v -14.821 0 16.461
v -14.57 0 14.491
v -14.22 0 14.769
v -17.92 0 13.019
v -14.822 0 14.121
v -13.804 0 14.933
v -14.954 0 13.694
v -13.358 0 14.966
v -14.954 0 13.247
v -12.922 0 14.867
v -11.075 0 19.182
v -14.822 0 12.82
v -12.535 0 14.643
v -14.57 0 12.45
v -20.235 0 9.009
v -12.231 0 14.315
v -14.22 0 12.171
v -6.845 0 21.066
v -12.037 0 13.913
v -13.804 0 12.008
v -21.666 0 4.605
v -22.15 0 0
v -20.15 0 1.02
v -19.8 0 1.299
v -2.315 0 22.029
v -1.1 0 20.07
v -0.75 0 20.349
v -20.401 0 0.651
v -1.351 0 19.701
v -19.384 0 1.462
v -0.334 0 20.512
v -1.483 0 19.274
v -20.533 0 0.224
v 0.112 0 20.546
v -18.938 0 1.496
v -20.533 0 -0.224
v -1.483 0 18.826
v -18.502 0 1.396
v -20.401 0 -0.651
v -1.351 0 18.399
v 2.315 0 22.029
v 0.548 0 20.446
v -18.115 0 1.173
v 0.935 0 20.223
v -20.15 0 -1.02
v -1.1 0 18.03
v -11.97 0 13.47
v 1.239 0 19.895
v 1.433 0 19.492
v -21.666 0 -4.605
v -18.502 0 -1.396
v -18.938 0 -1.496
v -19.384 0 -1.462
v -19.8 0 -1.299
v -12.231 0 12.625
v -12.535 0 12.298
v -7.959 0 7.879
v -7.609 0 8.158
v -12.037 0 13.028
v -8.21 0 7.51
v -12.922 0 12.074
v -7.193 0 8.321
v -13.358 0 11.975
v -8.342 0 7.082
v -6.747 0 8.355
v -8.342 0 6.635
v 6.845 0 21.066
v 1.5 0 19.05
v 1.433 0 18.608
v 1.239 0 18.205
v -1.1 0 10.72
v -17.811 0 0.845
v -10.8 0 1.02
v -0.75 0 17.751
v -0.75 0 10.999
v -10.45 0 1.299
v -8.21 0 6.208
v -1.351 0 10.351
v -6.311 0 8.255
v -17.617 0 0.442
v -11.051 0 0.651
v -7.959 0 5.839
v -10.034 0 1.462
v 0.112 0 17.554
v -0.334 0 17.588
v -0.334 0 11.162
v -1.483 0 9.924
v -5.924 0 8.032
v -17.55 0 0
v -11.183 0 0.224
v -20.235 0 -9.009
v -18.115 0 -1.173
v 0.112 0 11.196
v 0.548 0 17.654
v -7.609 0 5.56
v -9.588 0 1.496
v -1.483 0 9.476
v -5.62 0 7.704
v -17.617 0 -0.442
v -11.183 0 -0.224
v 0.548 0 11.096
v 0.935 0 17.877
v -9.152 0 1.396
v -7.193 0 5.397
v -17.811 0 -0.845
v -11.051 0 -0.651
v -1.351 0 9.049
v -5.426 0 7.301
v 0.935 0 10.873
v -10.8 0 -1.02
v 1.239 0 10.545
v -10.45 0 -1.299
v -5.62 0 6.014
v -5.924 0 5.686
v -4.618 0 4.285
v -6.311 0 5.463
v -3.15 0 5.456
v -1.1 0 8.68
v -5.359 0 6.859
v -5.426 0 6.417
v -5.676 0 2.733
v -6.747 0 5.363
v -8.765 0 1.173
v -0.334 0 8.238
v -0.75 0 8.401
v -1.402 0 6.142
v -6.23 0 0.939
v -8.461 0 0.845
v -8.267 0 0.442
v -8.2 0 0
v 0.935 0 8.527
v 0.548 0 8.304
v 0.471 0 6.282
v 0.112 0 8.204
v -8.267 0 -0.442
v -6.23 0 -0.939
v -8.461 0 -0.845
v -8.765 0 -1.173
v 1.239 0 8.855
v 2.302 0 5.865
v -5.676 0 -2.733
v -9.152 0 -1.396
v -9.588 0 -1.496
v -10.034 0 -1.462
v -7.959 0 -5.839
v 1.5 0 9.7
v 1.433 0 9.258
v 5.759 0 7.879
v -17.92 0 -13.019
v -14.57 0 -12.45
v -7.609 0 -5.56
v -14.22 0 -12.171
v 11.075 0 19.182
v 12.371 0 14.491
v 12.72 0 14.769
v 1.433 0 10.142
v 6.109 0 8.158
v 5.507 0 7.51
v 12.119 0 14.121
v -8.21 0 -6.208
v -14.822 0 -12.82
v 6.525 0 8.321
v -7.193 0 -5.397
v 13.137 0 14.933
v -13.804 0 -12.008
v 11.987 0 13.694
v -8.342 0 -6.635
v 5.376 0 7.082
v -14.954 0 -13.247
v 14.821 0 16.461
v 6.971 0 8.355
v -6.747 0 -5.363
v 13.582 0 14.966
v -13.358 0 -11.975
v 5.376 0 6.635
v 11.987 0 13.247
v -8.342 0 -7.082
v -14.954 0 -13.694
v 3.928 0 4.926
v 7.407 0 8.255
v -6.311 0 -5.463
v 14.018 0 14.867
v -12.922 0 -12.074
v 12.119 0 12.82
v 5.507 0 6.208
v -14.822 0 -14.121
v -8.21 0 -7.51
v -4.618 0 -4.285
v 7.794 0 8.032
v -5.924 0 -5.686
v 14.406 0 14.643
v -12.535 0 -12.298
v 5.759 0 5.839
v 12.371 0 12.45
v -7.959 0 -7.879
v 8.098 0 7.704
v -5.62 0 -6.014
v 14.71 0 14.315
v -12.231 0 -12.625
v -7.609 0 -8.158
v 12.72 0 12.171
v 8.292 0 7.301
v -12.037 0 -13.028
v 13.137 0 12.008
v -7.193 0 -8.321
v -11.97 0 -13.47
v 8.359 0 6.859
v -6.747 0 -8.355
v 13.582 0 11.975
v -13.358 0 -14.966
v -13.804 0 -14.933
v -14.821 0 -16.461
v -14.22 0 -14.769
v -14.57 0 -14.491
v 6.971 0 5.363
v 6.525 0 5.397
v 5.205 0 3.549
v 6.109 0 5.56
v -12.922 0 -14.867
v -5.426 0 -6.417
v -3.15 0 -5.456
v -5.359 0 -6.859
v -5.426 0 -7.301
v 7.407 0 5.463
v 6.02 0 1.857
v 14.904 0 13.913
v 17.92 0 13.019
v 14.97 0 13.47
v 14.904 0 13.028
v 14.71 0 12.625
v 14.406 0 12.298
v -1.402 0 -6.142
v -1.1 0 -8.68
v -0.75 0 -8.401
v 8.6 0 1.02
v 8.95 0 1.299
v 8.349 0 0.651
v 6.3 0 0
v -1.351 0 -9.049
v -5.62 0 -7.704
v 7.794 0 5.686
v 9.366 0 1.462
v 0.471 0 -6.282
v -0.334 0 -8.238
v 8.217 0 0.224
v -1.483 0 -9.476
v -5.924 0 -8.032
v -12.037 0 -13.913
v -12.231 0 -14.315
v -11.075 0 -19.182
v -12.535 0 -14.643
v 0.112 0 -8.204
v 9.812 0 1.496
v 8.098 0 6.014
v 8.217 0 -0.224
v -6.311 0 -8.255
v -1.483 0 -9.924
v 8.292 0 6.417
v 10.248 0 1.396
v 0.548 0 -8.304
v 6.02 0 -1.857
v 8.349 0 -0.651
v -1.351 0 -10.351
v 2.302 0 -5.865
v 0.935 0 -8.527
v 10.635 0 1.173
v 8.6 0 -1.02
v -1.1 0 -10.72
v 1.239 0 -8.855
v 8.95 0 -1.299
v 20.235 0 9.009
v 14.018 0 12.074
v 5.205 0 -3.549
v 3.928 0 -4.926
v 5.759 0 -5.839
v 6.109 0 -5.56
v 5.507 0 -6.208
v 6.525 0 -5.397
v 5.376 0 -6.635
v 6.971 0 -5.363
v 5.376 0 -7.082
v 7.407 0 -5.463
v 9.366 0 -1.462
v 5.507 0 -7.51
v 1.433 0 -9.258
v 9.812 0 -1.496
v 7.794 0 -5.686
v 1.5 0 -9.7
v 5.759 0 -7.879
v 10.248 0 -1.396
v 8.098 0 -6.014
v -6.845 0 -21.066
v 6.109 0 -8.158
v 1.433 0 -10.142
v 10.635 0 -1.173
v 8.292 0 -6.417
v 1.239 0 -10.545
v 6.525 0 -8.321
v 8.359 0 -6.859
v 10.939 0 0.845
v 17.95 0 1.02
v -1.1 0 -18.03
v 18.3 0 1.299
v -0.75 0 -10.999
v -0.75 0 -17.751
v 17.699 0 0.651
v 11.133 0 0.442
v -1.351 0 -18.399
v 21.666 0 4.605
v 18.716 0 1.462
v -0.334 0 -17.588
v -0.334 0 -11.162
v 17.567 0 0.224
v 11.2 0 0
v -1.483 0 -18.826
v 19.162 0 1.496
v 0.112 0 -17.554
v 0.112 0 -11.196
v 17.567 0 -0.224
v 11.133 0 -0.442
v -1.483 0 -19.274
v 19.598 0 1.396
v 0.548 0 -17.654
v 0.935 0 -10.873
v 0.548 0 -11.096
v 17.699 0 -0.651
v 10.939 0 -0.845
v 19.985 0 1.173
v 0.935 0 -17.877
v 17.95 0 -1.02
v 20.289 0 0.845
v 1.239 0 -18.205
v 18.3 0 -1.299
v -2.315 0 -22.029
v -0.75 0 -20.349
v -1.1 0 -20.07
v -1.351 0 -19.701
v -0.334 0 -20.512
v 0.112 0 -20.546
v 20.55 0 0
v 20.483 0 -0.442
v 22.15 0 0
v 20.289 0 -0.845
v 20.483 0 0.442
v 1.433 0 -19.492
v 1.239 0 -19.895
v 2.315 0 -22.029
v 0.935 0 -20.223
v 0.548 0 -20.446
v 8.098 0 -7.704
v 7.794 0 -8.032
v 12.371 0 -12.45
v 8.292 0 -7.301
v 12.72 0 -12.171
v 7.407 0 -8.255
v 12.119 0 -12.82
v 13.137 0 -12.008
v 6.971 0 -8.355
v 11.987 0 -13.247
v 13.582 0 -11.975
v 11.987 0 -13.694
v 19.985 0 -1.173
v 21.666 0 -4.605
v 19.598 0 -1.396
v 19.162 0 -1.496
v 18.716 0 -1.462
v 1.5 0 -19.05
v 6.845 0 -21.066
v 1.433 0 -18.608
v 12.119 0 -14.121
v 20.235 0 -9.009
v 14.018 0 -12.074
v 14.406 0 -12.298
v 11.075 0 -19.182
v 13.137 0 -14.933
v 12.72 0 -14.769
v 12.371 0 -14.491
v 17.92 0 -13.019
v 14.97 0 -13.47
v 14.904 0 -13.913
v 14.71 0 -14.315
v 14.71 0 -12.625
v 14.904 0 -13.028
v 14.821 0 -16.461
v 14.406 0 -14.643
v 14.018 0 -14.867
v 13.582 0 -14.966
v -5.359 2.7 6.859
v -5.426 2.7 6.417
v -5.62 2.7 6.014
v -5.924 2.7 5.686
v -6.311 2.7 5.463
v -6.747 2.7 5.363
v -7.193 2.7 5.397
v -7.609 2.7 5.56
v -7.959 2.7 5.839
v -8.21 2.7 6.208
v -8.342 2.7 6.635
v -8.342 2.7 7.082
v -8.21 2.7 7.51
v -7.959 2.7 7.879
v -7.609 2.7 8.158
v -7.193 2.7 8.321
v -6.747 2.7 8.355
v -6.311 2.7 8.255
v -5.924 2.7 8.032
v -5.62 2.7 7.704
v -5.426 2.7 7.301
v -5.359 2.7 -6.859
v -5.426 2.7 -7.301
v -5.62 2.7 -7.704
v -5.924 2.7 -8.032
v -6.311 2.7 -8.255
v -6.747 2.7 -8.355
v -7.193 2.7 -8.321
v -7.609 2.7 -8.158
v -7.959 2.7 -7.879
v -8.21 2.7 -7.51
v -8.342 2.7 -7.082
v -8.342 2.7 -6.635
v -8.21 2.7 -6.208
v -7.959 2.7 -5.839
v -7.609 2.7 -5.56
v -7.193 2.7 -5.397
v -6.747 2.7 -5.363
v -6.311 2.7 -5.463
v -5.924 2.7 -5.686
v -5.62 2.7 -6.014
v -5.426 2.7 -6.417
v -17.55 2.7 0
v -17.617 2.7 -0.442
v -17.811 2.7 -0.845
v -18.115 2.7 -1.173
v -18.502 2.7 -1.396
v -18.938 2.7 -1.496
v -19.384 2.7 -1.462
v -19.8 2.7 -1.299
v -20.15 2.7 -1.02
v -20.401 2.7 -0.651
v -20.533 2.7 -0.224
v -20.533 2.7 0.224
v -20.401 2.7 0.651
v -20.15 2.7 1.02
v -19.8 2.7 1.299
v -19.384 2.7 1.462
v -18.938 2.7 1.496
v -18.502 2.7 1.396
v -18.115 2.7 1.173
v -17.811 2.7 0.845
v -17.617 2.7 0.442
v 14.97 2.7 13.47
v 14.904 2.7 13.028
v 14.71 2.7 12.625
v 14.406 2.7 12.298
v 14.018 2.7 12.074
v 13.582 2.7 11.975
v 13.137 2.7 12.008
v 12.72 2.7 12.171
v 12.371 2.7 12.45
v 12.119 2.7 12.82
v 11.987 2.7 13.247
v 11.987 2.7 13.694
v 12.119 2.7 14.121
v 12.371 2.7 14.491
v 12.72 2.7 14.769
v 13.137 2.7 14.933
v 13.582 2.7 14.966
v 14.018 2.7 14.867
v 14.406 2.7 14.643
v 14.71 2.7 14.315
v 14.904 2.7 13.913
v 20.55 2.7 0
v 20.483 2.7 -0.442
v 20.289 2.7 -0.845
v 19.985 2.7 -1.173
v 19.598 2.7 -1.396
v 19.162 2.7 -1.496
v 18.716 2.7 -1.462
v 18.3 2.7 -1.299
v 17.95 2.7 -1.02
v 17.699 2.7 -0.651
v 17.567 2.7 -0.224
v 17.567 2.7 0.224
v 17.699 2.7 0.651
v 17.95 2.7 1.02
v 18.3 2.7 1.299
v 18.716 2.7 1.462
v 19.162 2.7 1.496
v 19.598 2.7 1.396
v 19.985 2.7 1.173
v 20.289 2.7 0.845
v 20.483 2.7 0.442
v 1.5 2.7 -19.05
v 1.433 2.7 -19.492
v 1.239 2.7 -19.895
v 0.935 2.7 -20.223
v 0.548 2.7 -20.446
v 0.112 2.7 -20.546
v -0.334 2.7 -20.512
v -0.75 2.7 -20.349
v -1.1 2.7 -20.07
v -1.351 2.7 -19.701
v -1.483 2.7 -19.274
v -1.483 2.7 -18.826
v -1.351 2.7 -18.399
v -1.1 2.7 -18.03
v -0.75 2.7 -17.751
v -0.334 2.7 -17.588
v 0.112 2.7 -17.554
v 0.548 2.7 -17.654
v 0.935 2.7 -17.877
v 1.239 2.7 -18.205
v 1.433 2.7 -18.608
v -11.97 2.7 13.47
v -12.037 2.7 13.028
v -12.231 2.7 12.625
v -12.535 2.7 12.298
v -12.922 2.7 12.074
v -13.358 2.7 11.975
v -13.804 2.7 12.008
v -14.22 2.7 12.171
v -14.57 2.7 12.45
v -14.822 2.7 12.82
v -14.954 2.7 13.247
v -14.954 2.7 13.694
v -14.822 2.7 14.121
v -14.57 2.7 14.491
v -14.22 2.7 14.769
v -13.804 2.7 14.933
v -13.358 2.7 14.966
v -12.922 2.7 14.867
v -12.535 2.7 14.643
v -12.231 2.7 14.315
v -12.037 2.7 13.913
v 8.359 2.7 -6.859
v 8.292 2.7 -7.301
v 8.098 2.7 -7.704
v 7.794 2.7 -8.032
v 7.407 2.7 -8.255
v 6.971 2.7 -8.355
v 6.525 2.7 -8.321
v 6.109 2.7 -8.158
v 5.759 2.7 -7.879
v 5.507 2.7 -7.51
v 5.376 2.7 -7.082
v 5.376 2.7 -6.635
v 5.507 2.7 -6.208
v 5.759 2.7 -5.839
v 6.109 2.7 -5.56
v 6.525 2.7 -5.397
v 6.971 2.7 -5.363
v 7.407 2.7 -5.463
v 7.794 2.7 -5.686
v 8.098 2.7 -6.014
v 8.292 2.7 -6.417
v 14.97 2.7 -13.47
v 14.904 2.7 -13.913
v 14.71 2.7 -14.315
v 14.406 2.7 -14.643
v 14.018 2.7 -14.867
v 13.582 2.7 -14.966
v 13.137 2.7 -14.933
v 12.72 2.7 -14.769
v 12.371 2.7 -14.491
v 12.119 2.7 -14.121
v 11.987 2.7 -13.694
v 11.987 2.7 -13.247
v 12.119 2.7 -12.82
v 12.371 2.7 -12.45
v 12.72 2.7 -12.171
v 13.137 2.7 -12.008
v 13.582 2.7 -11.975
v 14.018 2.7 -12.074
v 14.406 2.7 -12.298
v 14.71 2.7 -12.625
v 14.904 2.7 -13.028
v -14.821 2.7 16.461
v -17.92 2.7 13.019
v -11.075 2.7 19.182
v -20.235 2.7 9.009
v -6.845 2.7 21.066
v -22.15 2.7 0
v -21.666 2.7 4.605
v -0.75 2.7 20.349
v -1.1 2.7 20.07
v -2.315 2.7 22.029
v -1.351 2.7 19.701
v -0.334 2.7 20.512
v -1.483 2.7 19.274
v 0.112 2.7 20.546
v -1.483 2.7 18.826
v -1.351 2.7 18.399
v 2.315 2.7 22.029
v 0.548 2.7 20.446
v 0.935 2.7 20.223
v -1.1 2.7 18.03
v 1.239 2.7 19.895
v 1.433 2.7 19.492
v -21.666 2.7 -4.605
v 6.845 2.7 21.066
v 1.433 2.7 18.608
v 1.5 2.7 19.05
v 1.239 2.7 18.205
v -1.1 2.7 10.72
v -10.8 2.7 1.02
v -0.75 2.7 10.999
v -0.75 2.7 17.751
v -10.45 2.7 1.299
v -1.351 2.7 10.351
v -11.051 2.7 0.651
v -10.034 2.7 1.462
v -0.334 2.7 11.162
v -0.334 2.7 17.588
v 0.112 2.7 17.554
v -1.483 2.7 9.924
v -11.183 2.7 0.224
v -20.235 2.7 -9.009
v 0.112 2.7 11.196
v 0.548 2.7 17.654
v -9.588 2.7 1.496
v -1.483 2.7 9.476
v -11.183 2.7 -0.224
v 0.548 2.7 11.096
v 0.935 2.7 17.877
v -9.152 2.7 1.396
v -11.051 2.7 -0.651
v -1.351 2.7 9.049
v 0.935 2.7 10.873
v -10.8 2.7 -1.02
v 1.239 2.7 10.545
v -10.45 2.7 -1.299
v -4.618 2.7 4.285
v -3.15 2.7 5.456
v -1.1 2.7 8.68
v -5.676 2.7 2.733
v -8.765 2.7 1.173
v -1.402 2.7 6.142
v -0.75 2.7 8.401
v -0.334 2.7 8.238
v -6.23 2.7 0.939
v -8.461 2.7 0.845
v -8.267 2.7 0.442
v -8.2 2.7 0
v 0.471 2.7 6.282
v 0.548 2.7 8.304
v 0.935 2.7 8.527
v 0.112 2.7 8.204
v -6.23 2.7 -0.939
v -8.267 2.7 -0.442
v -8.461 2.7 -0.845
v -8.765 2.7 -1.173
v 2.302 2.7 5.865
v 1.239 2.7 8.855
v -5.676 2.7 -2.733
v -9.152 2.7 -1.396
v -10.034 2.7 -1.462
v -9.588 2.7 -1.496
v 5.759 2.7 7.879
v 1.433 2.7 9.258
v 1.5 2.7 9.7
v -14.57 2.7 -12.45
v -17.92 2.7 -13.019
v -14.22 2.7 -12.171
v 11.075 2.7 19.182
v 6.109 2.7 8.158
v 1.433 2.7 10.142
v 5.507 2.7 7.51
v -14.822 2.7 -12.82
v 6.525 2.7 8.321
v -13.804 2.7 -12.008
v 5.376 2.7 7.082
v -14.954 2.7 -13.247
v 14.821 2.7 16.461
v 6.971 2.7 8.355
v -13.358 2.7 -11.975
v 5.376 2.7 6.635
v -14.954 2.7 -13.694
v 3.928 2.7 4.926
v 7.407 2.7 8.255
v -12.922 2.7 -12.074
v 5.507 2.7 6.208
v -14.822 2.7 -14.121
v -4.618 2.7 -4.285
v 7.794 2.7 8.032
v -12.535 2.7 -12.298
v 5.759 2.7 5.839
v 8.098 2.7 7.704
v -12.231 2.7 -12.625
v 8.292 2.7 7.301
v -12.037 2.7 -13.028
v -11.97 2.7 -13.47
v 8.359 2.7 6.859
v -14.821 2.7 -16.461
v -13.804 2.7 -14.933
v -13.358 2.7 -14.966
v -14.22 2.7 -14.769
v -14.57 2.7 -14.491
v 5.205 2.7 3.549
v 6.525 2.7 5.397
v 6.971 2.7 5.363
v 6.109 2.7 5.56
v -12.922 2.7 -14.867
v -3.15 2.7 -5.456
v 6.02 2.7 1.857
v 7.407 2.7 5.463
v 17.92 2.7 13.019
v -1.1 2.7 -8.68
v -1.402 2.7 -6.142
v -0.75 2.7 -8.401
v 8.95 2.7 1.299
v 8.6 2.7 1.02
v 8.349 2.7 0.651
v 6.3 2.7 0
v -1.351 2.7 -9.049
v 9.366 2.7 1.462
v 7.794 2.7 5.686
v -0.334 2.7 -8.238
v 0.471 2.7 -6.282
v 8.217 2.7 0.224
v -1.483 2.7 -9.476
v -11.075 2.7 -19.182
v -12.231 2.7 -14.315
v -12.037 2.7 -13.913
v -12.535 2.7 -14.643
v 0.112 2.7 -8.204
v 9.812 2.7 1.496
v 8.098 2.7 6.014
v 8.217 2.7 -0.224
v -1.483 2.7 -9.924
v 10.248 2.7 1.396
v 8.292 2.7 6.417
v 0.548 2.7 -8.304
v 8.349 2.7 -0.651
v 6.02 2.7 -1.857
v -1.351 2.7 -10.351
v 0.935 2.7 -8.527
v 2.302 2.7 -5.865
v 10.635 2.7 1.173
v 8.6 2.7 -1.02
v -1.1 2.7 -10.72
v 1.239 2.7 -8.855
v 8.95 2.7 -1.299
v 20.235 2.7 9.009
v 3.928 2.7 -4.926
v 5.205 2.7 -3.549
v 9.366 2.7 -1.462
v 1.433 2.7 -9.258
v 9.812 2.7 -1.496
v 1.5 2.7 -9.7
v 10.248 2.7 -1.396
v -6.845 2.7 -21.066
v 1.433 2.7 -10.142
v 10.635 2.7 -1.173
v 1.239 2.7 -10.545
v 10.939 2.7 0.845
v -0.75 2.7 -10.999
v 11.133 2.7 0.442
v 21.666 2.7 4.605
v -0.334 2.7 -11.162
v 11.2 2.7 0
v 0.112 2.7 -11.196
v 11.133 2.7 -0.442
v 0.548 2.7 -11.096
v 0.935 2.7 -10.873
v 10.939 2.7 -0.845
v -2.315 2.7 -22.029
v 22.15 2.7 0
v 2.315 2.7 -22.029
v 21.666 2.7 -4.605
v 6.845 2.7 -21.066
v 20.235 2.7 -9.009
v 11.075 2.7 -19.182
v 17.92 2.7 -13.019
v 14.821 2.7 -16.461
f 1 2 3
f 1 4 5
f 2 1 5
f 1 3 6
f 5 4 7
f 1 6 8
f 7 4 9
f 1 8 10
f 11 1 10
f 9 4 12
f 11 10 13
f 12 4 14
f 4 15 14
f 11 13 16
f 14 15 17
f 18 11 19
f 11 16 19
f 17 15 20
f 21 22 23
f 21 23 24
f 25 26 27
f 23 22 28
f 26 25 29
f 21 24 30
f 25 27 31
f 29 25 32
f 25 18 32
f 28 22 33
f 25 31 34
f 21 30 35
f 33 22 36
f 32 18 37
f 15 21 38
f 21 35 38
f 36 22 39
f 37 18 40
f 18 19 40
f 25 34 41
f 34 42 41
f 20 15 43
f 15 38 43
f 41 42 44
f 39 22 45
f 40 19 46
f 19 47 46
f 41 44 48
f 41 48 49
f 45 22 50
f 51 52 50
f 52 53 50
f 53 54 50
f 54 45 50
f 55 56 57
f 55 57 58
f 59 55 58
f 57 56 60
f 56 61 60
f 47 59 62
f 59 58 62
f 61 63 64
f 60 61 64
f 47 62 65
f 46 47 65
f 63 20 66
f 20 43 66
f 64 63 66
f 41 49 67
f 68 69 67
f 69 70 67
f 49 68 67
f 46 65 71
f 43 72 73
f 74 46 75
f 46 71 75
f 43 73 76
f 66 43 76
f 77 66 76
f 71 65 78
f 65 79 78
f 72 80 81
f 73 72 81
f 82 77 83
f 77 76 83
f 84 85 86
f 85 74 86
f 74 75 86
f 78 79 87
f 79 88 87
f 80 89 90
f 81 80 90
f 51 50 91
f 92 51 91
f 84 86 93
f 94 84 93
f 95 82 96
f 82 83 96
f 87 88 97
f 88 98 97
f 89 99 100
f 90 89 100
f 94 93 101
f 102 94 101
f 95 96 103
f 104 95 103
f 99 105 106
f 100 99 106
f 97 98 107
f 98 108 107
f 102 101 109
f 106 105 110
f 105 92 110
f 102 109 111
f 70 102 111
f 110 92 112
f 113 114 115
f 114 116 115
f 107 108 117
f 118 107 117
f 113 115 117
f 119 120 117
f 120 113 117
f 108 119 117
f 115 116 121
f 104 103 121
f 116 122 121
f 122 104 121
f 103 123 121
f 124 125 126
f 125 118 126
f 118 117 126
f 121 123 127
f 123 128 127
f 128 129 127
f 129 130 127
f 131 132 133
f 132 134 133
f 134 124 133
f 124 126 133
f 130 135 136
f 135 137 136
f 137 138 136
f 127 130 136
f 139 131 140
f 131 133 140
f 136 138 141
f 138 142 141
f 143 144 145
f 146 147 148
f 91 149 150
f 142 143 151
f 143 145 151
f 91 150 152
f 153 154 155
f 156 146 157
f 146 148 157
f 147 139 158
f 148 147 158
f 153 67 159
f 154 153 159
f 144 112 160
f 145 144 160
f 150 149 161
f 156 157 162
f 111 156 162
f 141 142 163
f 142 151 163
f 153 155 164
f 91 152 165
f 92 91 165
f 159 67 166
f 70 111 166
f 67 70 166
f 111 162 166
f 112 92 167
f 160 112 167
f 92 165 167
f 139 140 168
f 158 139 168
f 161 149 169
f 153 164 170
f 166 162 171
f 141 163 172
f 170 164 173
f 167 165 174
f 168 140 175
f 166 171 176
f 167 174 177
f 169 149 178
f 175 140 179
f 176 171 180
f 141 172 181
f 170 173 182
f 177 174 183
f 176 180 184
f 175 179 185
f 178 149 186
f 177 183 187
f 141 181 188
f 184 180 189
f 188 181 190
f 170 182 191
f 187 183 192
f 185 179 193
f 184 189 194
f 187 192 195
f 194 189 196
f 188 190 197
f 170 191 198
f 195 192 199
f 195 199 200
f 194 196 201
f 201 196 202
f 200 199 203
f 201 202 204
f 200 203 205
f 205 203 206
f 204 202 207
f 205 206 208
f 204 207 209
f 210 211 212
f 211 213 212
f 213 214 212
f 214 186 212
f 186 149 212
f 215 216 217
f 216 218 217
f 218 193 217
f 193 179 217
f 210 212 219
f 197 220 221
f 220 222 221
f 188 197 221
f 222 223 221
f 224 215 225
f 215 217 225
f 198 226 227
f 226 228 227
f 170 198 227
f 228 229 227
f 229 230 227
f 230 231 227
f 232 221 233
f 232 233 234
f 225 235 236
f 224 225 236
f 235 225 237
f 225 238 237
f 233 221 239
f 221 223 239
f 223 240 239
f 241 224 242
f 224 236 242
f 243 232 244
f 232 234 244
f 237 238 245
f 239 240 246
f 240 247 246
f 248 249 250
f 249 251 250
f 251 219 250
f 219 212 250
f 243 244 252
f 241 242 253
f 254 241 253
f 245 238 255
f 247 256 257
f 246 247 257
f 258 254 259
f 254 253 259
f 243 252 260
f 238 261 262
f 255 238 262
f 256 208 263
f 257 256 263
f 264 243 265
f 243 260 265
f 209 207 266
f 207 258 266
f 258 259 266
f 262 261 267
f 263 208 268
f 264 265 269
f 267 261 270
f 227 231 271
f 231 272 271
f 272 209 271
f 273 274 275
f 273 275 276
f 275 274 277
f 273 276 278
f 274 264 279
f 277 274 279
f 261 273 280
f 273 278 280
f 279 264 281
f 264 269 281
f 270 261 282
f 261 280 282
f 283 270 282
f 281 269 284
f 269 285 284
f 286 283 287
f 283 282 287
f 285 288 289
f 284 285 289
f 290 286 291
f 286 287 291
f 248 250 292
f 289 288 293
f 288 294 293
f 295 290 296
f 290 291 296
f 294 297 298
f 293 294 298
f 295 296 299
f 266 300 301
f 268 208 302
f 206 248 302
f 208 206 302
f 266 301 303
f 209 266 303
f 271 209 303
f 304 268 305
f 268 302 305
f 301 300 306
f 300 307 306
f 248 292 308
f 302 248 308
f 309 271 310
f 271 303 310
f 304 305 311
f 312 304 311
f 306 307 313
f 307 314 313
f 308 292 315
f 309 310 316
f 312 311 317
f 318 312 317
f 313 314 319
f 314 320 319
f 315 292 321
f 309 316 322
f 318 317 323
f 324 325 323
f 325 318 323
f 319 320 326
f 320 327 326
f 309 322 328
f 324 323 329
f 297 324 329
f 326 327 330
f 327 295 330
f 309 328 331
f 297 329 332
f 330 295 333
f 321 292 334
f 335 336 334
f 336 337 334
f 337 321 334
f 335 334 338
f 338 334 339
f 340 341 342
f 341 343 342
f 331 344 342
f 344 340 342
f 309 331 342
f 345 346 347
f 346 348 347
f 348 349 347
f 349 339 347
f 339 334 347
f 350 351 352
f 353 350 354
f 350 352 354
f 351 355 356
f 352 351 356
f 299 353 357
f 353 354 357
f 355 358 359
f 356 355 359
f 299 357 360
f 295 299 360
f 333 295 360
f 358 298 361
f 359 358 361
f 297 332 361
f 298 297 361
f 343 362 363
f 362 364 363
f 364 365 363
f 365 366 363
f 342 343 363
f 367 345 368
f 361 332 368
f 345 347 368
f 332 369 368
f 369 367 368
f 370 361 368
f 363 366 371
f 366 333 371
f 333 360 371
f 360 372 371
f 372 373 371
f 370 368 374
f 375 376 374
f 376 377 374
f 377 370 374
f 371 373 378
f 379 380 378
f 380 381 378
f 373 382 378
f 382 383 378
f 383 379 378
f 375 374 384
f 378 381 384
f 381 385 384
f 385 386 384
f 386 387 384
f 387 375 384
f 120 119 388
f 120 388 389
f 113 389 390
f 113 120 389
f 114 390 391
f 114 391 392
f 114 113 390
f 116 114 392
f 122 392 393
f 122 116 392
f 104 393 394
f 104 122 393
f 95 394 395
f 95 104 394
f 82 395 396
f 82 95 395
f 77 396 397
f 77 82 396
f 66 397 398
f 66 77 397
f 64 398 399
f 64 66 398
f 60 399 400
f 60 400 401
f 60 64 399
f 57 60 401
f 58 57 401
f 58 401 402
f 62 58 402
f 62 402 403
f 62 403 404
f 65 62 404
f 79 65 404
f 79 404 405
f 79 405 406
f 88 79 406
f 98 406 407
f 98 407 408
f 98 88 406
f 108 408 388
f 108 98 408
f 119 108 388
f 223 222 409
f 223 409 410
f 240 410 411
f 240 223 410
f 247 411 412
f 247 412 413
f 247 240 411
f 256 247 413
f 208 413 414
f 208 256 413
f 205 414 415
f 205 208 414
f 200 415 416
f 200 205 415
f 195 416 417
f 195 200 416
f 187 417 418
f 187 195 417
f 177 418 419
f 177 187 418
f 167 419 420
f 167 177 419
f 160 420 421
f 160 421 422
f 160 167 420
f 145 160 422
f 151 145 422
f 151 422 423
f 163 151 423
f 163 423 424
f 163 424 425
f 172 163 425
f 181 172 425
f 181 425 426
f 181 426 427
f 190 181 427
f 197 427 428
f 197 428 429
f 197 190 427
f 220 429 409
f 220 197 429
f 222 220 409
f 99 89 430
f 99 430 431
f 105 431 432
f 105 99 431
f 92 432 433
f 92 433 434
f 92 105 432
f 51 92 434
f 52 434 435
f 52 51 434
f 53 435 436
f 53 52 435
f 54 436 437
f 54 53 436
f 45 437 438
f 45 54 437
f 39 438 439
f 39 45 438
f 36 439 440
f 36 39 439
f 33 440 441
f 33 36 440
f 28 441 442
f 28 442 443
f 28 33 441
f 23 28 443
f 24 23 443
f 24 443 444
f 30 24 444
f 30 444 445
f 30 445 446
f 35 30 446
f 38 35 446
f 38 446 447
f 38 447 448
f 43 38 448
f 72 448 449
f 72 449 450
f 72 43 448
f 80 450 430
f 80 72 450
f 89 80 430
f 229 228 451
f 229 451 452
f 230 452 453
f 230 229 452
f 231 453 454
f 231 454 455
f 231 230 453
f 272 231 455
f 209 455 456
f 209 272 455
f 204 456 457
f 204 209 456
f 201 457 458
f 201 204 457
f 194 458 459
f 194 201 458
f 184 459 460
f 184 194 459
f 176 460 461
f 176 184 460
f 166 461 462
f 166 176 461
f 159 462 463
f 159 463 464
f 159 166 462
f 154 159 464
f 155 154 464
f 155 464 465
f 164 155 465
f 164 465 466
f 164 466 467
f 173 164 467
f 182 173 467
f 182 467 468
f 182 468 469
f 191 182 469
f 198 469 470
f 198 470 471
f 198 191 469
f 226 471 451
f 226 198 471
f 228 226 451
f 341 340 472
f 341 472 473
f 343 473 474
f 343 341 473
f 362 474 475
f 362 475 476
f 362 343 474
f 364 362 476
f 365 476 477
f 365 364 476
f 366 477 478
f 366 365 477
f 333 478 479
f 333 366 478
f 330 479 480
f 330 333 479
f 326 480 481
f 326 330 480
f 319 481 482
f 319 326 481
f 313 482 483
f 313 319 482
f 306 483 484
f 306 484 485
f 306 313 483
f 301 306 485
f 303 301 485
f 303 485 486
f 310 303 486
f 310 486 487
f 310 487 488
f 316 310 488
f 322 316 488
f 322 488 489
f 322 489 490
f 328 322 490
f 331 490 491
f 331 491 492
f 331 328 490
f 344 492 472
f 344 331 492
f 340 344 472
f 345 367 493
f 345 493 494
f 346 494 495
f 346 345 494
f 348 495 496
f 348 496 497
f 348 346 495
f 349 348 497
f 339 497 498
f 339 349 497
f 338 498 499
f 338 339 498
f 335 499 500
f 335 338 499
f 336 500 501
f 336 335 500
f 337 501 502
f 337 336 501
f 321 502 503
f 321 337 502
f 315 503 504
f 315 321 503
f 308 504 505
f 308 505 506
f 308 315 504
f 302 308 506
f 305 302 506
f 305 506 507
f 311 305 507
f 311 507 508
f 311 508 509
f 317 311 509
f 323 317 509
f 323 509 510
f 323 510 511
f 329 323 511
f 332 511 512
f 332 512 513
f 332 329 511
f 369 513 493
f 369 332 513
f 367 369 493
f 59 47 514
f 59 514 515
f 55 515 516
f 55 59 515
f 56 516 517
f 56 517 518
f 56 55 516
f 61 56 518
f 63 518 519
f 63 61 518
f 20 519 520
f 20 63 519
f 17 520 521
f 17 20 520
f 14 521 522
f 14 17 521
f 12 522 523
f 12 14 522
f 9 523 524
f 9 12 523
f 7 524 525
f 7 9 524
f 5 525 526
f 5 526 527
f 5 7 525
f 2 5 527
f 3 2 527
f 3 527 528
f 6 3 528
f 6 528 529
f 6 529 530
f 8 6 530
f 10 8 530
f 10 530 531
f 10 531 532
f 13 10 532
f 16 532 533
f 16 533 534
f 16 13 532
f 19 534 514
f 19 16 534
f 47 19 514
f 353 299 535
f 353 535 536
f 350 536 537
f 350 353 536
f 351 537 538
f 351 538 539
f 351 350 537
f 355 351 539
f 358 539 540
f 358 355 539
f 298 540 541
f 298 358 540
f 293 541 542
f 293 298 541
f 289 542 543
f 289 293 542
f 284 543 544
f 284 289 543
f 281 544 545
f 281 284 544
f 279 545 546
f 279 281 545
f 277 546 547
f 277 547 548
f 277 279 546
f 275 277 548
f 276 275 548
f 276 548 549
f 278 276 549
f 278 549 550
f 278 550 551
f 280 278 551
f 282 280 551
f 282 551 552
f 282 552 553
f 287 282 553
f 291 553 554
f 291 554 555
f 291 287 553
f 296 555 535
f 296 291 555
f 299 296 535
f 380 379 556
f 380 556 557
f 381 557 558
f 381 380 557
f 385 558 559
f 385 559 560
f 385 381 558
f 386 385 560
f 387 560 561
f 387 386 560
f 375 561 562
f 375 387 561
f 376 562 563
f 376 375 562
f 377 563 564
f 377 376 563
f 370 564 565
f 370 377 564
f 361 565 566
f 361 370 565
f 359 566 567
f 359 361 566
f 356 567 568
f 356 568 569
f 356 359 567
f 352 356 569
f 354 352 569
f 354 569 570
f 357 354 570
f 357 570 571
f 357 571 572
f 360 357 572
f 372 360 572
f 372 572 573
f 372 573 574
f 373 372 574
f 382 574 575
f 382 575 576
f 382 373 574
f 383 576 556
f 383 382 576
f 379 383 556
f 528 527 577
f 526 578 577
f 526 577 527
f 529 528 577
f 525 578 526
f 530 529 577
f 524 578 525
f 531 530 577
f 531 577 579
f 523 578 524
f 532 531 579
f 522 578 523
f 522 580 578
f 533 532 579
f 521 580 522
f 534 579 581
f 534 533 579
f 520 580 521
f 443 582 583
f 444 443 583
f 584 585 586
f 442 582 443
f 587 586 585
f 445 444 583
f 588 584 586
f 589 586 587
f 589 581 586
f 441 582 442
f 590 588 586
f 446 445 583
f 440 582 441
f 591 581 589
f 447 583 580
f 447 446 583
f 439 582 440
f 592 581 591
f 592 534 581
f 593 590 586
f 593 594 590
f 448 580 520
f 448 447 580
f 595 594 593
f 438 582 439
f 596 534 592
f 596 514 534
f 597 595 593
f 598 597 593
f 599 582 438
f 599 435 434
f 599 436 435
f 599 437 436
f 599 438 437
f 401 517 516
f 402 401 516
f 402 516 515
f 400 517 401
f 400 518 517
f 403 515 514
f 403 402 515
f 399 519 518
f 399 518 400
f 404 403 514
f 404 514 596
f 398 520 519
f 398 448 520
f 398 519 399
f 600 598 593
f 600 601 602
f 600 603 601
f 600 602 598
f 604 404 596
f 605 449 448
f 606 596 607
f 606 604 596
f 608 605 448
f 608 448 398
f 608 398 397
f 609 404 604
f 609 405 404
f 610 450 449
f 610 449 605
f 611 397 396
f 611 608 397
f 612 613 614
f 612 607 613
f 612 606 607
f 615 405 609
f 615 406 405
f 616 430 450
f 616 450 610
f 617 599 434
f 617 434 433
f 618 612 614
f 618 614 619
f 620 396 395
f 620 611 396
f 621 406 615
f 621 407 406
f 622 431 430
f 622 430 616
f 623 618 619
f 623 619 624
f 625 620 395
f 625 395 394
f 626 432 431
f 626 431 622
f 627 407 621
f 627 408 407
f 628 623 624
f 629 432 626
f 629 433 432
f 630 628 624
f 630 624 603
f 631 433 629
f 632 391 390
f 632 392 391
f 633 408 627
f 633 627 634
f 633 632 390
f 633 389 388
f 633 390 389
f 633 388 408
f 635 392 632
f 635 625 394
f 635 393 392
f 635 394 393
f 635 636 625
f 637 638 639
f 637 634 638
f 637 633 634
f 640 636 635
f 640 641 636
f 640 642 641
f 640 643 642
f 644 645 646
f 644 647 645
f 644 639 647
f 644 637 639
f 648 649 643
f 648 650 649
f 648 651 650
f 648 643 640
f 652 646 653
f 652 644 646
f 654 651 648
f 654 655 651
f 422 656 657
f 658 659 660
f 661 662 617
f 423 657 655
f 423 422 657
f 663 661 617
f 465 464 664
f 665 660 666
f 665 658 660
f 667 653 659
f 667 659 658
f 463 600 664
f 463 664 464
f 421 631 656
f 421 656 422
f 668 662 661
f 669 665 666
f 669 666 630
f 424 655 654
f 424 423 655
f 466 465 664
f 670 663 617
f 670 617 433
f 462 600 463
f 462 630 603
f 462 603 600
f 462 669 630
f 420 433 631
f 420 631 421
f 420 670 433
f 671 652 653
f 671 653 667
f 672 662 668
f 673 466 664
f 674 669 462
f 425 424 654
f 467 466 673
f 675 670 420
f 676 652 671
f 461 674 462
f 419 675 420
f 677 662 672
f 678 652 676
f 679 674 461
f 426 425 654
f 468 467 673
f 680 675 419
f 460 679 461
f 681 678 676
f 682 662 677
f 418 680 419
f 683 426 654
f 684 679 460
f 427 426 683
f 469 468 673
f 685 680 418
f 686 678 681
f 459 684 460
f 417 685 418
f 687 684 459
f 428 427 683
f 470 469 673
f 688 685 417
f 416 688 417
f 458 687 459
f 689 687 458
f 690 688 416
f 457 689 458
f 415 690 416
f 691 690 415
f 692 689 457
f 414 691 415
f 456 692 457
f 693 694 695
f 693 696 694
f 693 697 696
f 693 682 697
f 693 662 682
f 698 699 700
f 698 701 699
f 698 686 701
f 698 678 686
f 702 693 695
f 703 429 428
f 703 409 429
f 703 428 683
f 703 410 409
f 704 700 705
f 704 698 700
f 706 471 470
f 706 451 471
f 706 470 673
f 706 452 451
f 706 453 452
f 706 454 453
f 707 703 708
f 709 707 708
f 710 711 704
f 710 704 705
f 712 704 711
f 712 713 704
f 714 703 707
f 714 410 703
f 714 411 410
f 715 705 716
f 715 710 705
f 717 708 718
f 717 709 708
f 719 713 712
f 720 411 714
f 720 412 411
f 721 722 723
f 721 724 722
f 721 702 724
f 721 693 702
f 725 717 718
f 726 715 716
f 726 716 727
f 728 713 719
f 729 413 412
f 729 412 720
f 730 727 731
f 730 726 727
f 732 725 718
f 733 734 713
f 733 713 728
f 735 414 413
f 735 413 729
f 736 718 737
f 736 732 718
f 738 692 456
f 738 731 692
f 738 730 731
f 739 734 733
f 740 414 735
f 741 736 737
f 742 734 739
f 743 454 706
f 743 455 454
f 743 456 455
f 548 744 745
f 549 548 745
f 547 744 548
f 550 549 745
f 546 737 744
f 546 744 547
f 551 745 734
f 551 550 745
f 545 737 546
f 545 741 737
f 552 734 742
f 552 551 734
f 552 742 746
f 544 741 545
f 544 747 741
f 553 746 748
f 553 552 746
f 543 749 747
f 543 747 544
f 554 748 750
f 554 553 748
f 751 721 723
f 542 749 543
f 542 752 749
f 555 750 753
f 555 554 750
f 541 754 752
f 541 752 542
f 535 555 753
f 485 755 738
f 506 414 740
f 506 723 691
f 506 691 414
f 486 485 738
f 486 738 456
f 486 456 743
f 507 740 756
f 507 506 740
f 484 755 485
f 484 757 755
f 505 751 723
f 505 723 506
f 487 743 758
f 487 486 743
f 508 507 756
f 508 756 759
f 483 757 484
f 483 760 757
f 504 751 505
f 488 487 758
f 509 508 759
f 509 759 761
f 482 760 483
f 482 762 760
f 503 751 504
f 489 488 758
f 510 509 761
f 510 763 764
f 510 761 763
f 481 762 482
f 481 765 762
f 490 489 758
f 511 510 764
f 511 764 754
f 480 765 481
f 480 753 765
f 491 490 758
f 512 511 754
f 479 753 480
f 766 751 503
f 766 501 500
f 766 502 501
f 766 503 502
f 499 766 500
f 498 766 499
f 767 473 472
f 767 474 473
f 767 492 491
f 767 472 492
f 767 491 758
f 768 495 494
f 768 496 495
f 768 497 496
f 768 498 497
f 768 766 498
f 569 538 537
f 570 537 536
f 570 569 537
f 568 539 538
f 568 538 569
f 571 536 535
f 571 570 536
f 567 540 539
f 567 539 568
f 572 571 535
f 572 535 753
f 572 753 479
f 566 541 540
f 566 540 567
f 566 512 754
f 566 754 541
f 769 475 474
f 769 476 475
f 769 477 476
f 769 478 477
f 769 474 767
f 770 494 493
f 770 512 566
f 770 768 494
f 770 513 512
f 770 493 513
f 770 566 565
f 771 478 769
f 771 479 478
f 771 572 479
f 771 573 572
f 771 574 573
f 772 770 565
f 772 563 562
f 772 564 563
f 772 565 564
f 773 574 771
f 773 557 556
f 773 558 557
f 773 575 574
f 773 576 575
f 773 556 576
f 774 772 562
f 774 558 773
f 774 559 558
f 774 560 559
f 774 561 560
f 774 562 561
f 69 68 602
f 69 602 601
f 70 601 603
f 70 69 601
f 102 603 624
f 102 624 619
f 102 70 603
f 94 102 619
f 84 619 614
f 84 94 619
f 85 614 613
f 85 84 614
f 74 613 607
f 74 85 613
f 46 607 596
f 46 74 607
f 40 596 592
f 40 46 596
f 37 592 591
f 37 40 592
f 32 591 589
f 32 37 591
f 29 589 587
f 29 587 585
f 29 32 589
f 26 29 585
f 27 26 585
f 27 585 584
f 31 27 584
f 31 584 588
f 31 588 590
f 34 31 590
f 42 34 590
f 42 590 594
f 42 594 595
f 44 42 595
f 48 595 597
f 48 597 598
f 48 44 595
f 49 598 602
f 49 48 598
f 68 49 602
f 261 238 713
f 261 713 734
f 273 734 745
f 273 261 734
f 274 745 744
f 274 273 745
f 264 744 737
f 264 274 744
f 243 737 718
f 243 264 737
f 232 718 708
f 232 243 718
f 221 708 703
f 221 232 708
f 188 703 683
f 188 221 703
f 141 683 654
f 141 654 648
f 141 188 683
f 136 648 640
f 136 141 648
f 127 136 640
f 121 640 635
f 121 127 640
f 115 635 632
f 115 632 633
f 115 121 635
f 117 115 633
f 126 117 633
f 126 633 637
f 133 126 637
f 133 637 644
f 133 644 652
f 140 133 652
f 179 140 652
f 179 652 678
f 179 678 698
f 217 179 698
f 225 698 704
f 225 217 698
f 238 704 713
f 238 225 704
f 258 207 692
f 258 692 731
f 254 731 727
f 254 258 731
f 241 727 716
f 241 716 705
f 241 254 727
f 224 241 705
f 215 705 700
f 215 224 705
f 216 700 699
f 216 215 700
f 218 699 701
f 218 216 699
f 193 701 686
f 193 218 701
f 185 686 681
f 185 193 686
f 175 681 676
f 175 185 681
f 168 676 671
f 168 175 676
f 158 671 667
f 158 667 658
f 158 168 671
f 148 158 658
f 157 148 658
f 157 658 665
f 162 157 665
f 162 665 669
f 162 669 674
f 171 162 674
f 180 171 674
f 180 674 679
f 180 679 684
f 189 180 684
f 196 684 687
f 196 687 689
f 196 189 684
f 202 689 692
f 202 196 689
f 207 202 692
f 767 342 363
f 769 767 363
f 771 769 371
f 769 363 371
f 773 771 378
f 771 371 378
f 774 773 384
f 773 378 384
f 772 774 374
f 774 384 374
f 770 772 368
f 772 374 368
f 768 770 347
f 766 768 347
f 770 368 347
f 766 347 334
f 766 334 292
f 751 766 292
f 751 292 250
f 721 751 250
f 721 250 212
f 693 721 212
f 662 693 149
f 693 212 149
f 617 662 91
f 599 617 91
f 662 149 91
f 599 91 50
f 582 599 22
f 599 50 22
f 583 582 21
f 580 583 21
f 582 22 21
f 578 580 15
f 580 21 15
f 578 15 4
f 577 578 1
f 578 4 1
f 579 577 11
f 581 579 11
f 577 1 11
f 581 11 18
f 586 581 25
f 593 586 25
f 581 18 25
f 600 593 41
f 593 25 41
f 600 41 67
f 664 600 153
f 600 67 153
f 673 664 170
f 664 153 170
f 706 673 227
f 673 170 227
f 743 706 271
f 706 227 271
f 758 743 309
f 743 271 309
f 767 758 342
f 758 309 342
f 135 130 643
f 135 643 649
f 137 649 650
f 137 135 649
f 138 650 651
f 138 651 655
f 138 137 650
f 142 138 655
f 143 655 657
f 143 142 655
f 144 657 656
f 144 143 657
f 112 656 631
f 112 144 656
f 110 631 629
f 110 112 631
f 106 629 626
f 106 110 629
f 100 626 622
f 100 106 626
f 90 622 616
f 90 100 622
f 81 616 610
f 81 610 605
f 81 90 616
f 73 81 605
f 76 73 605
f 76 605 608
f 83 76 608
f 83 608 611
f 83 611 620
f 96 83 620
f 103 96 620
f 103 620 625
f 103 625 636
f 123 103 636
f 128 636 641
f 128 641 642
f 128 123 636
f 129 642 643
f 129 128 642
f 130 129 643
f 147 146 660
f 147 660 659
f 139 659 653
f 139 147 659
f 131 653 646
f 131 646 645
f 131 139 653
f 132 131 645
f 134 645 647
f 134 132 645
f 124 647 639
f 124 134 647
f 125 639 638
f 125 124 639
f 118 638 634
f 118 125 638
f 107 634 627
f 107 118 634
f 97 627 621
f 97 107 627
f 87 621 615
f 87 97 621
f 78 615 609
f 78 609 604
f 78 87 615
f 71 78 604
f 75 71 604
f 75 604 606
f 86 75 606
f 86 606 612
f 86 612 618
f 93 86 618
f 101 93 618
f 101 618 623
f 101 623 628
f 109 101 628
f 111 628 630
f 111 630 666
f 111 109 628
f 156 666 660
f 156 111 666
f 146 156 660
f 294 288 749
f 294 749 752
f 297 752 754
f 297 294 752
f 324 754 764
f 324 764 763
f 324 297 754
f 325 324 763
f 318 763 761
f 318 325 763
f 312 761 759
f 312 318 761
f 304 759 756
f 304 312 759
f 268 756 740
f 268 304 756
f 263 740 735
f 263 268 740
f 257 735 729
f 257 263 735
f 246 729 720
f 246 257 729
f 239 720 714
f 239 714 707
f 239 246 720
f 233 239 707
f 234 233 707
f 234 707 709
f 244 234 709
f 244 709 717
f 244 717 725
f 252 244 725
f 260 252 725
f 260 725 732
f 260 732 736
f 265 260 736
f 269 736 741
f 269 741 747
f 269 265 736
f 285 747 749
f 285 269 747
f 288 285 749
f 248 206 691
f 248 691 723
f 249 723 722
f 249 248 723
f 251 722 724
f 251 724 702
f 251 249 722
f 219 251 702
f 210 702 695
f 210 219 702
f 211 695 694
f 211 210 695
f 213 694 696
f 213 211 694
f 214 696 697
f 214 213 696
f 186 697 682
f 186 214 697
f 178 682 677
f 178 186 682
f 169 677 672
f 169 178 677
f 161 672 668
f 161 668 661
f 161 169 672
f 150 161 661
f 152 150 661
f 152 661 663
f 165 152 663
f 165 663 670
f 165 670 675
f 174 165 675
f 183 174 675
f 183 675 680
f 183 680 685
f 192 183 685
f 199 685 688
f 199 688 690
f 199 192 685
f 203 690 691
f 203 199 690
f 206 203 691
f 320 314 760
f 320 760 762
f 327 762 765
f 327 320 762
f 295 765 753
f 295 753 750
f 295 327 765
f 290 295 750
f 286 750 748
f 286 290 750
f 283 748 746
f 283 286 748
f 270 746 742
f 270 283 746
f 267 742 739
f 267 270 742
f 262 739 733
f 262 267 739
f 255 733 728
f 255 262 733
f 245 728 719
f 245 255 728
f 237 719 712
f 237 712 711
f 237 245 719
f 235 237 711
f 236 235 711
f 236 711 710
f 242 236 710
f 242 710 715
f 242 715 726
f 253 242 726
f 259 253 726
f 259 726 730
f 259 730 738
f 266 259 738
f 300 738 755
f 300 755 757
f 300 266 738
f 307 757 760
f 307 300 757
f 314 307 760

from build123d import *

# Parameters (mm, degrees)
CROQUIS1_R              = 22.15
CROQUIS1_R_2            = 6.3
CROQUIS1_R_3            = 1.5
SALIENTE_EXTRUIR1_DEPTH = 2.7


with BuildPart() as part:
    # Croquis1 → Saliente-Extruir1 (new body)
    with BuildSketch(Plane(origin=(0, 0, 0), x_dir=(1, 0, 0), z_dir=(0, 1, 0))):
        Circle(CROQUIS1_R)
        Circle(CROQUIS1_R_2, mode=Mode.SUBTRACT)
        with Locations((0, 19.05)):
            Circle(CROQUIS1_R_3, mode=Mode.SUBTRACT)
        with Locations((13.470384182, 13.470384182)):
            Circle(CROQUIS1_R_3, mode=Mode.SUBTRACT)
        with Locations((19.05, 0)):
            Circle(CROQUIS1_R_3, mode=Mode.SUBTRACT)
        with Locations((13.470384182, -13.470384182)):
            Circle(CROQUIS1_R_3, mode=Mode.SUBTRACT)
        with Locations((0, -19.05)):
            Circle(CROQUIS1_R_3, mode=Mode.SUBTRACT)
        with Locations((-13.470384182, -13.470384182)):
            Circle(CROQUIS1_R_3, mode=Mode.SUBTRACT)
        with Locations((-19.05, 0)):
            Circle(CROQUIS1_R_3, mode=Mode.SUBTRACT)
        with Locations((-13.470384182, 13.470384182)):
            Circle(CROQUIS1_R_3, mode=Mode.SUBTRACT)
        with Locations((0, 9.7)):
            Circle(CROQUIS1_R_3, mode=Mode.SUBTRACT)
        with Locations((6.858935778, 6.858935778)):
            Circle(CROQUIS1_R_3, mode=Mode.SUBTRACT)
        with Locations((9.7, 0)):
            Circle(CROQUIS1_R_3, mode=Mode.SUBTRACT)
        with Locations((6.858935778, -6.858935778)):
            Circle(CROQUIS1_R_3, mode=Mode.SUBTRACT)
        with Locations((0, -9.7)):
            Circle(CROQUIS1_R_3, mode=Mode.SUBTRACT)
        with Locations((-6.858935778, -6.858935778)):
            Circle(CROQUIS1_R_3, mode=Mode.SUBTRACT)
        with Locations((-9.7, 0)):
            Circle(CROQUIS1_R_3, mode=Mode.SUBTRACT)
        with Locations((-6.858935778, 6.858935778)):
            Circle(CROQUIS1_R_3, mode=Mode.SUBTRACT)
    extrude(amount=SALIENTE_EXTRUIR1_DEPTH)


solid = part.part
